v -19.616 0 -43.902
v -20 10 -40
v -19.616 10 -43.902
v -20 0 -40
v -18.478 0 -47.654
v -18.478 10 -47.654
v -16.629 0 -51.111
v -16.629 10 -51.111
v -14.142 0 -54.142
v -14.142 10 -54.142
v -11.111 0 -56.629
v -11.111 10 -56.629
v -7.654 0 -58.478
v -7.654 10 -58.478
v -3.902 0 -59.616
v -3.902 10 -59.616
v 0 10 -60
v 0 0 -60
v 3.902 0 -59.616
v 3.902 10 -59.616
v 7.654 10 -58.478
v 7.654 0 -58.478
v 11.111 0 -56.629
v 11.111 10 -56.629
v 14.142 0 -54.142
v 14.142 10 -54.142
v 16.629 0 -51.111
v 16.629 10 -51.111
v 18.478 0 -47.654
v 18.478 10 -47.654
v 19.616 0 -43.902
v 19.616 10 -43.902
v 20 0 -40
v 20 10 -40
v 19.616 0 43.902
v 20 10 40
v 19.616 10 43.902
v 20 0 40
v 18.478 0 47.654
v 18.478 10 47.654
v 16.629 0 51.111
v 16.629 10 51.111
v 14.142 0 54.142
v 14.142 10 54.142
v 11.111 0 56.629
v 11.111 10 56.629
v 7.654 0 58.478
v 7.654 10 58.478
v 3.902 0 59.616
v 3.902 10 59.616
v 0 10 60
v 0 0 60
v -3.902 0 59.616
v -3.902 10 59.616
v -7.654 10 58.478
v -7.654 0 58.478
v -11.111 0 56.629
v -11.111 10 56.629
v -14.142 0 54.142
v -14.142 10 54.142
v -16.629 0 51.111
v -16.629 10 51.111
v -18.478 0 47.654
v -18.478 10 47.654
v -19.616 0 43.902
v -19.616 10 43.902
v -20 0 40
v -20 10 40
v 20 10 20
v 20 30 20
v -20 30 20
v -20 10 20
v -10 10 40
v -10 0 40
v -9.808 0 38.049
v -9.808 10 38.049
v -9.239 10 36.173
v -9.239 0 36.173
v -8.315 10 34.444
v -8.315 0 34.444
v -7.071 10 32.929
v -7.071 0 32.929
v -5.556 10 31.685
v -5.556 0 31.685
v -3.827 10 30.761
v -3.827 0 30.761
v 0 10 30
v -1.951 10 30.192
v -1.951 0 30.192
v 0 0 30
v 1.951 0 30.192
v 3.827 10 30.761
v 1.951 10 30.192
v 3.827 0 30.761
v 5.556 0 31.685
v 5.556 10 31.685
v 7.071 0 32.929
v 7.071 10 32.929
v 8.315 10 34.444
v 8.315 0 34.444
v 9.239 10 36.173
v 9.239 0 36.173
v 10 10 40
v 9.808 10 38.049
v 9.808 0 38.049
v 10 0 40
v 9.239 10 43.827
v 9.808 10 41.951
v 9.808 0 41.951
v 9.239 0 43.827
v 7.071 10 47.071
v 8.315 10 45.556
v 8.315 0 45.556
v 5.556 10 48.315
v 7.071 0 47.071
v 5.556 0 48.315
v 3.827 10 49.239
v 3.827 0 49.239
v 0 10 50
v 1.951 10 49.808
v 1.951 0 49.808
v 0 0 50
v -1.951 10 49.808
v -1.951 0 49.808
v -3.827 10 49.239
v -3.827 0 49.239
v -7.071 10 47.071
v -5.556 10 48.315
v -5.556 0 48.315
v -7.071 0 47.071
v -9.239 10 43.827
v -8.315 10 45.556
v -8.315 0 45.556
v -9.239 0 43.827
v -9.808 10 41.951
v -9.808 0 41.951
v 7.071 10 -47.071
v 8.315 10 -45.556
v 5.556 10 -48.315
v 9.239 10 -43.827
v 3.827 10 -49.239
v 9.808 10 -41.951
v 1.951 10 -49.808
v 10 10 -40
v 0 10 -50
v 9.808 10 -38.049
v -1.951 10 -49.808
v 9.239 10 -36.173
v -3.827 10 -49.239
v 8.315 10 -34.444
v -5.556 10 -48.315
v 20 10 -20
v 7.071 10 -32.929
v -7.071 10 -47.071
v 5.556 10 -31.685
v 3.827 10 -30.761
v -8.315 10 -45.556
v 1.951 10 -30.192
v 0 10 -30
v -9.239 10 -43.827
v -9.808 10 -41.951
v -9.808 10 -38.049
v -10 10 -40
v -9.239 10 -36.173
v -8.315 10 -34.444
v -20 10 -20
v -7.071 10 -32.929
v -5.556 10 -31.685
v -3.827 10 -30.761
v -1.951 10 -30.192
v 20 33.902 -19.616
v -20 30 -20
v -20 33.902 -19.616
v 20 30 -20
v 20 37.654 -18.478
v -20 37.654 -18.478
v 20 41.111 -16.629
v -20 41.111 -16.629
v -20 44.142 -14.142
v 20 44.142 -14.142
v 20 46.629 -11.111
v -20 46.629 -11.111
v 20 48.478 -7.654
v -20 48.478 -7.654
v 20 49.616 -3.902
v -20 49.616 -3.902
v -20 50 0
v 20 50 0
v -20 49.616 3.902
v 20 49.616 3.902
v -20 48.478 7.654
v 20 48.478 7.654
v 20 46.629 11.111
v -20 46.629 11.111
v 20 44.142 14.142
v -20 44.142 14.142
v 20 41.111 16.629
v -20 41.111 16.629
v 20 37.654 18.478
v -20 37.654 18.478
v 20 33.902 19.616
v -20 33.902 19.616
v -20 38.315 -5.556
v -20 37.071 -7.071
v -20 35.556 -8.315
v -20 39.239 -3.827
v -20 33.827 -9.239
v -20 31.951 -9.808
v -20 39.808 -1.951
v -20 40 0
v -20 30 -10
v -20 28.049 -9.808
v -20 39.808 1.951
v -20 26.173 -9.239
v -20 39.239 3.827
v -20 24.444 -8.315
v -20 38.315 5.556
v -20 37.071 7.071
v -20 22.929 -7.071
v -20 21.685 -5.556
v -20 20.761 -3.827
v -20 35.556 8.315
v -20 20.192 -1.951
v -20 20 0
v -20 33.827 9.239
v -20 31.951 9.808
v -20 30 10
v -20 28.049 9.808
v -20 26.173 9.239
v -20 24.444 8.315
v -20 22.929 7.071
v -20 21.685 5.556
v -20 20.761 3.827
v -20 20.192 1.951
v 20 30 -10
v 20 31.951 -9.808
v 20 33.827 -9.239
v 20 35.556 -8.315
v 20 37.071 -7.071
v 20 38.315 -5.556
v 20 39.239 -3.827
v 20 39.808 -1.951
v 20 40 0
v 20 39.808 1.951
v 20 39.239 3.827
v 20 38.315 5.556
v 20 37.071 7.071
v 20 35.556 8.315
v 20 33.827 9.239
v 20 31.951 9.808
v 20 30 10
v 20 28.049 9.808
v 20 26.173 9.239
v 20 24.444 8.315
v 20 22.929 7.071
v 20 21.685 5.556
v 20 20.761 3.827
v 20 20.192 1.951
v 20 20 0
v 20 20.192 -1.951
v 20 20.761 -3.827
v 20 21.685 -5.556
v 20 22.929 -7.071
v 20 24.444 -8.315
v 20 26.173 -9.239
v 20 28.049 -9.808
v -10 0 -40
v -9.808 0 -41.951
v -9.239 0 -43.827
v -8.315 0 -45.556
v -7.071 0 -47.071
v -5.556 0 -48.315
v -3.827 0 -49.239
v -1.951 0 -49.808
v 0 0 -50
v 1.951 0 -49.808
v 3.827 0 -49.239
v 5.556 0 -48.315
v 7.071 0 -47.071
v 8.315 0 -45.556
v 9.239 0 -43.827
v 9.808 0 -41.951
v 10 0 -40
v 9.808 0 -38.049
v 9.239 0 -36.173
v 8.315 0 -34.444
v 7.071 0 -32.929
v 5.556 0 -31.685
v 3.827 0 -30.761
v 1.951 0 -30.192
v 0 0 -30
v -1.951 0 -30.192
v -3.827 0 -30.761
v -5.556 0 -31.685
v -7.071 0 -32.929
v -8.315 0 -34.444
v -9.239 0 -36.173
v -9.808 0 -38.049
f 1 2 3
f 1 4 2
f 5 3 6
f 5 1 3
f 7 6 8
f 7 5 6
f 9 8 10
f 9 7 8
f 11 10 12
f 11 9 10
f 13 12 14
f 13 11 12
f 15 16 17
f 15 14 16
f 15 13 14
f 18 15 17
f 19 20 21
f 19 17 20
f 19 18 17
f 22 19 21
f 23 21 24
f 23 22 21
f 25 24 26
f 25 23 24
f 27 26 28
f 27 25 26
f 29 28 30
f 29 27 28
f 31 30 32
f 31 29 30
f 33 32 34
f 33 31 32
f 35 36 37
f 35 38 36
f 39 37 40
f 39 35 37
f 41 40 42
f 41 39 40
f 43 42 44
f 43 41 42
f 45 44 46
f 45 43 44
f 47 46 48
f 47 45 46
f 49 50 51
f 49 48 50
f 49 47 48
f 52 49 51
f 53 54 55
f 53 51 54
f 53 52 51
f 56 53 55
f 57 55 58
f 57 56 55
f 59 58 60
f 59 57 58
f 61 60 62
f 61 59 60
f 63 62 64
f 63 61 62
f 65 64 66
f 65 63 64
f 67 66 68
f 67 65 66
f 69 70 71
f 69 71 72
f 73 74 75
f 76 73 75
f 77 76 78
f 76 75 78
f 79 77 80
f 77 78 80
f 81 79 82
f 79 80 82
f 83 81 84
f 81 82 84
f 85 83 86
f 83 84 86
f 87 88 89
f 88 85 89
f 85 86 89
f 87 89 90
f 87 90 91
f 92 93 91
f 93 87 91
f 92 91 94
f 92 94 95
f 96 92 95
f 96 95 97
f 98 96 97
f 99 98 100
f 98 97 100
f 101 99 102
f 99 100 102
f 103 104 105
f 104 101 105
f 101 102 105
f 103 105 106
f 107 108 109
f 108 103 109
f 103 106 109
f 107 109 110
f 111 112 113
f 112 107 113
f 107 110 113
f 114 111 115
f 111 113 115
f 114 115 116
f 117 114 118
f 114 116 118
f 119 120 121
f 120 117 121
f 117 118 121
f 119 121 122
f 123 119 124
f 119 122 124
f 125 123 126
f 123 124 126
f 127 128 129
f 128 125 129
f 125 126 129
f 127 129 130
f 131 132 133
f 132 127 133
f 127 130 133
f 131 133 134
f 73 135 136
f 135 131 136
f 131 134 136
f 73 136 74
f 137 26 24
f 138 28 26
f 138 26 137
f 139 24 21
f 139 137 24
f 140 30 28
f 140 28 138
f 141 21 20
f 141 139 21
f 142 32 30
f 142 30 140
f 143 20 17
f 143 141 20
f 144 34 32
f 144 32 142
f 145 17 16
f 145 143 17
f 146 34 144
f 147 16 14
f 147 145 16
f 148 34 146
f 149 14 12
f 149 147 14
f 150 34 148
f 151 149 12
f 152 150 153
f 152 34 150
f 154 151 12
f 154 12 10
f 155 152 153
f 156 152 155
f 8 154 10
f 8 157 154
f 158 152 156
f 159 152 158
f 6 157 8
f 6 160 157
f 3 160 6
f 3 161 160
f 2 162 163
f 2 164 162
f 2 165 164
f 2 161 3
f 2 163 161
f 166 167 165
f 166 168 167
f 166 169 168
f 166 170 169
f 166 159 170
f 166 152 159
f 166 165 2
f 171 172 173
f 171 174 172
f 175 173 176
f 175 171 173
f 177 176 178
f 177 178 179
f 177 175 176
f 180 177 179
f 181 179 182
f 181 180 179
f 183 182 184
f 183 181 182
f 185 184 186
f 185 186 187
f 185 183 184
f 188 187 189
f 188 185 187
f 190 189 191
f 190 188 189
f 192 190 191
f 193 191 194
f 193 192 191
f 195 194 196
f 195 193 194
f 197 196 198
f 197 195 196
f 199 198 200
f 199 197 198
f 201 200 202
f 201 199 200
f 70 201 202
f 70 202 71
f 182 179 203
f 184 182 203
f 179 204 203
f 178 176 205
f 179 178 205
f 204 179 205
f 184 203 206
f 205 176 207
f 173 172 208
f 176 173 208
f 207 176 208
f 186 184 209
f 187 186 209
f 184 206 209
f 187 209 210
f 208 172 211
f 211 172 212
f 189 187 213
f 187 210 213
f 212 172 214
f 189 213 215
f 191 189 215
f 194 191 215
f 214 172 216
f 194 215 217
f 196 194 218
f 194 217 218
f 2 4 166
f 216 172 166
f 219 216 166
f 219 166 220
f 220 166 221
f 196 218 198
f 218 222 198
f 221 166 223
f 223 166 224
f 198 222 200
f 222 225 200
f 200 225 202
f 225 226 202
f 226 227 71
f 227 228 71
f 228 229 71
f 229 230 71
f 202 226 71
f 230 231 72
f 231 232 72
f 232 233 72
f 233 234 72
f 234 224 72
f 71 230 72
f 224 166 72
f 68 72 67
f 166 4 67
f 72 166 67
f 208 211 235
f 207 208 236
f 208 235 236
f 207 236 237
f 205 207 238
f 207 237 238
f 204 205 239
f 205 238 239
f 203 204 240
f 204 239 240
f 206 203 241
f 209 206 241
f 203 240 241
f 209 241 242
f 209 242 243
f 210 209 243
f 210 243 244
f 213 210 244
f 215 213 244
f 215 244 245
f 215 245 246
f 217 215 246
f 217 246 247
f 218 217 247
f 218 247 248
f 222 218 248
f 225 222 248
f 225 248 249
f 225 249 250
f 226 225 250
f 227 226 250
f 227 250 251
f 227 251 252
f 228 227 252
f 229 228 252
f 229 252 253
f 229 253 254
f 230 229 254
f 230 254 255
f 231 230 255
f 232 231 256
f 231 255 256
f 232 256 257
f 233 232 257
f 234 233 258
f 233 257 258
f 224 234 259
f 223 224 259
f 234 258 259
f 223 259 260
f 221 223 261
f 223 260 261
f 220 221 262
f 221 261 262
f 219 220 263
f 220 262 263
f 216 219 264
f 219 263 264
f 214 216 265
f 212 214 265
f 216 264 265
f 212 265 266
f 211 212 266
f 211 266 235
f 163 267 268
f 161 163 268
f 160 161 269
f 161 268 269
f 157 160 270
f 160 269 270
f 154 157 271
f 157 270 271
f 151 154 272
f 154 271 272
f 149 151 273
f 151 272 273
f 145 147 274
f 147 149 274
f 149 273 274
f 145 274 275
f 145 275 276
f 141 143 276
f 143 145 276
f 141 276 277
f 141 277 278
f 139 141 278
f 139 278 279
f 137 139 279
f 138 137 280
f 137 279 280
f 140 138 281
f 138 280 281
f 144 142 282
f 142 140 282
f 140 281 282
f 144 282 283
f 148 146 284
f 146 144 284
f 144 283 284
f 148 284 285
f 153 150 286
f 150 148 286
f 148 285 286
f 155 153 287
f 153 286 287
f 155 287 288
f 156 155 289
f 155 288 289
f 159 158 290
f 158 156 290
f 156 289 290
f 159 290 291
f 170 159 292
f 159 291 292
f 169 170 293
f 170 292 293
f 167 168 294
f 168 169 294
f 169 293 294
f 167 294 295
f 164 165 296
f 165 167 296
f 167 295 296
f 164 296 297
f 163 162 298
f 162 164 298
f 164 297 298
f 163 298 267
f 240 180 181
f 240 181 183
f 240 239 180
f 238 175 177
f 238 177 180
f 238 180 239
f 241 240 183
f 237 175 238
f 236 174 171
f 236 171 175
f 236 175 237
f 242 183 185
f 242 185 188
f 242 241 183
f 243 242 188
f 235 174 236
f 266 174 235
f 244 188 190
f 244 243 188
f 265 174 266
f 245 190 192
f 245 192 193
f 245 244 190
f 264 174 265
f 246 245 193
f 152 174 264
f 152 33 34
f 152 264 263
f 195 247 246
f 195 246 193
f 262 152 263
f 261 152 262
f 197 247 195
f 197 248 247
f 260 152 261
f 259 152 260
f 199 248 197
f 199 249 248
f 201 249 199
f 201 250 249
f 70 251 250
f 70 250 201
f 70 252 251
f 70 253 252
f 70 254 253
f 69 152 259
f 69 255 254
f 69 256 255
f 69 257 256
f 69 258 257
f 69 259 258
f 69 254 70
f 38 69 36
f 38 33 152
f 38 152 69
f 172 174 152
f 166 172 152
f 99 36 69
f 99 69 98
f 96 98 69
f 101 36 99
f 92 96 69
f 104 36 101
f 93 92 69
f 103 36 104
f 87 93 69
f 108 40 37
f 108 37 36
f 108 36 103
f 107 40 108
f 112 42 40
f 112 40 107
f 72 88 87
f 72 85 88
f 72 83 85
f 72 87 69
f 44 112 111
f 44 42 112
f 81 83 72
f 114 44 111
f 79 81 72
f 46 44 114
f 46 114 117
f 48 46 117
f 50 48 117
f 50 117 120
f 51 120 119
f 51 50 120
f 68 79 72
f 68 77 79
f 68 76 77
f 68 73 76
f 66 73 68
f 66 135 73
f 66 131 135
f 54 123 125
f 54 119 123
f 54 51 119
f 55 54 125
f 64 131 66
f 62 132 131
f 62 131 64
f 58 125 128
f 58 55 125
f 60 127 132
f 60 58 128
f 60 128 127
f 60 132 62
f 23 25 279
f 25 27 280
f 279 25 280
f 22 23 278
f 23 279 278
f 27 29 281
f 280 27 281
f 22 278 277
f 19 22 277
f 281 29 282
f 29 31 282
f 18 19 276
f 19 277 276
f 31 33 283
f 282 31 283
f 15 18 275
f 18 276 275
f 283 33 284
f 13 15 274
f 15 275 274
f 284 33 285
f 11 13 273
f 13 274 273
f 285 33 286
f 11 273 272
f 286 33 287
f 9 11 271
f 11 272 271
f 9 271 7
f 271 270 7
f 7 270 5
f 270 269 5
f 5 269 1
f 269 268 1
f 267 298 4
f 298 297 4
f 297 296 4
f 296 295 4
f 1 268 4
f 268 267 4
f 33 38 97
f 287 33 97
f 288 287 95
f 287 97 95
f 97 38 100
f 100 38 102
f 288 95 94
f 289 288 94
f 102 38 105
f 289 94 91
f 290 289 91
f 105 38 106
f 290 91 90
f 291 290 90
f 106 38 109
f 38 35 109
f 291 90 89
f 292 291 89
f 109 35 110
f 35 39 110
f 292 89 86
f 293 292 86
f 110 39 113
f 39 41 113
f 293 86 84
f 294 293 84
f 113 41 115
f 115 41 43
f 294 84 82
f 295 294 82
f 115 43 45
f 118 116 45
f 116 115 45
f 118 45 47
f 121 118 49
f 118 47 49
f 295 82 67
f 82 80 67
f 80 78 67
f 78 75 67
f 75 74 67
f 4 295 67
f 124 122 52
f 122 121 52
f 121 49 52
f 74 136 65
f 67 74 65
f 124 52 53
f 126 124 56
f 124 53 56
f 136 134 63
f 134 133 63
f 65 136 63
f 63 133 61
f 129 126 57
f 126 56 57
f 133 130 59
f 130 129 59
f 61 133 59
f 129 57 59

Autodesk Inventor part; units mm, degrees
ref_plane "YZ Plane" through (0, 0, 0) normal (1, 0, 0) x (0, 1, 0)
ref_plane "XZ Plane" through (0, 0, 0) normal (0, 1, 0) x (-1, 0, 0)
ref_plane "XY Plane" through (0, 0, 0) normal (0, 0, 1) x (1, 0, 0)
sketch "Boceto1" plane through (0, 0, 0) normal (0, 1, 0) x (-1, 0, 0)
  line L0 (-20, 20) -> (-20, -20)
  line L1 (20, -20) -> (20, 20)
  arc A0 (20, 40) -> (-20, 40) centre (0, 40) ccw
  arc A1 (-20, -40) -> (20, -40) centre (0, -40) ccw
  circle A2 centre (0, -40) radius 10
  line L2 (20, 20) -> (20, 40)
  line L3 (-20, 20) -> (-20, 40)
  line L4 (20, -20) -> (20, -40)
  line L5 (-20, -20) -> (-20, -40)
  circle A3 centre (0, 40) radius 10
  point P0 (0, 0)
extrude "Extrusión1" add sketch "Boceto1" along normal blind 10
sketch "Boceto2" plane through (20, 0, 40) normal (1, 0, 0) x (0, 0, -1)
  line L0 (80, 10) -> (0, 10) construction
  circle A0 centre (40, 30) radius 10
  arc A1 (60, 30) -> (20, 30) centre (40, 30) ccw
  line L1 (20, 30) -> (20, 10)
  line L2 (60, 30) -> (60, 10)
  line L3 (20, 10) -> (60, 10)
  point P0 (40, 0)
extrude "Extrusión2" add sketch "Boceto2" against normal blind 40
thread "Rosca1" size "M20x2.5" class "6H" standard "ANSI Metric M Profile" full length
thread "Rosca2" size "M20x2.5" class "6H" standard "ANSI Metric M Profile" full length
thread "Rosca3" size "M20x2.5" class "6H" standard "ANSI Metric M Profile" full length
properties part number "Tarea 1 Lab Dinamica"
